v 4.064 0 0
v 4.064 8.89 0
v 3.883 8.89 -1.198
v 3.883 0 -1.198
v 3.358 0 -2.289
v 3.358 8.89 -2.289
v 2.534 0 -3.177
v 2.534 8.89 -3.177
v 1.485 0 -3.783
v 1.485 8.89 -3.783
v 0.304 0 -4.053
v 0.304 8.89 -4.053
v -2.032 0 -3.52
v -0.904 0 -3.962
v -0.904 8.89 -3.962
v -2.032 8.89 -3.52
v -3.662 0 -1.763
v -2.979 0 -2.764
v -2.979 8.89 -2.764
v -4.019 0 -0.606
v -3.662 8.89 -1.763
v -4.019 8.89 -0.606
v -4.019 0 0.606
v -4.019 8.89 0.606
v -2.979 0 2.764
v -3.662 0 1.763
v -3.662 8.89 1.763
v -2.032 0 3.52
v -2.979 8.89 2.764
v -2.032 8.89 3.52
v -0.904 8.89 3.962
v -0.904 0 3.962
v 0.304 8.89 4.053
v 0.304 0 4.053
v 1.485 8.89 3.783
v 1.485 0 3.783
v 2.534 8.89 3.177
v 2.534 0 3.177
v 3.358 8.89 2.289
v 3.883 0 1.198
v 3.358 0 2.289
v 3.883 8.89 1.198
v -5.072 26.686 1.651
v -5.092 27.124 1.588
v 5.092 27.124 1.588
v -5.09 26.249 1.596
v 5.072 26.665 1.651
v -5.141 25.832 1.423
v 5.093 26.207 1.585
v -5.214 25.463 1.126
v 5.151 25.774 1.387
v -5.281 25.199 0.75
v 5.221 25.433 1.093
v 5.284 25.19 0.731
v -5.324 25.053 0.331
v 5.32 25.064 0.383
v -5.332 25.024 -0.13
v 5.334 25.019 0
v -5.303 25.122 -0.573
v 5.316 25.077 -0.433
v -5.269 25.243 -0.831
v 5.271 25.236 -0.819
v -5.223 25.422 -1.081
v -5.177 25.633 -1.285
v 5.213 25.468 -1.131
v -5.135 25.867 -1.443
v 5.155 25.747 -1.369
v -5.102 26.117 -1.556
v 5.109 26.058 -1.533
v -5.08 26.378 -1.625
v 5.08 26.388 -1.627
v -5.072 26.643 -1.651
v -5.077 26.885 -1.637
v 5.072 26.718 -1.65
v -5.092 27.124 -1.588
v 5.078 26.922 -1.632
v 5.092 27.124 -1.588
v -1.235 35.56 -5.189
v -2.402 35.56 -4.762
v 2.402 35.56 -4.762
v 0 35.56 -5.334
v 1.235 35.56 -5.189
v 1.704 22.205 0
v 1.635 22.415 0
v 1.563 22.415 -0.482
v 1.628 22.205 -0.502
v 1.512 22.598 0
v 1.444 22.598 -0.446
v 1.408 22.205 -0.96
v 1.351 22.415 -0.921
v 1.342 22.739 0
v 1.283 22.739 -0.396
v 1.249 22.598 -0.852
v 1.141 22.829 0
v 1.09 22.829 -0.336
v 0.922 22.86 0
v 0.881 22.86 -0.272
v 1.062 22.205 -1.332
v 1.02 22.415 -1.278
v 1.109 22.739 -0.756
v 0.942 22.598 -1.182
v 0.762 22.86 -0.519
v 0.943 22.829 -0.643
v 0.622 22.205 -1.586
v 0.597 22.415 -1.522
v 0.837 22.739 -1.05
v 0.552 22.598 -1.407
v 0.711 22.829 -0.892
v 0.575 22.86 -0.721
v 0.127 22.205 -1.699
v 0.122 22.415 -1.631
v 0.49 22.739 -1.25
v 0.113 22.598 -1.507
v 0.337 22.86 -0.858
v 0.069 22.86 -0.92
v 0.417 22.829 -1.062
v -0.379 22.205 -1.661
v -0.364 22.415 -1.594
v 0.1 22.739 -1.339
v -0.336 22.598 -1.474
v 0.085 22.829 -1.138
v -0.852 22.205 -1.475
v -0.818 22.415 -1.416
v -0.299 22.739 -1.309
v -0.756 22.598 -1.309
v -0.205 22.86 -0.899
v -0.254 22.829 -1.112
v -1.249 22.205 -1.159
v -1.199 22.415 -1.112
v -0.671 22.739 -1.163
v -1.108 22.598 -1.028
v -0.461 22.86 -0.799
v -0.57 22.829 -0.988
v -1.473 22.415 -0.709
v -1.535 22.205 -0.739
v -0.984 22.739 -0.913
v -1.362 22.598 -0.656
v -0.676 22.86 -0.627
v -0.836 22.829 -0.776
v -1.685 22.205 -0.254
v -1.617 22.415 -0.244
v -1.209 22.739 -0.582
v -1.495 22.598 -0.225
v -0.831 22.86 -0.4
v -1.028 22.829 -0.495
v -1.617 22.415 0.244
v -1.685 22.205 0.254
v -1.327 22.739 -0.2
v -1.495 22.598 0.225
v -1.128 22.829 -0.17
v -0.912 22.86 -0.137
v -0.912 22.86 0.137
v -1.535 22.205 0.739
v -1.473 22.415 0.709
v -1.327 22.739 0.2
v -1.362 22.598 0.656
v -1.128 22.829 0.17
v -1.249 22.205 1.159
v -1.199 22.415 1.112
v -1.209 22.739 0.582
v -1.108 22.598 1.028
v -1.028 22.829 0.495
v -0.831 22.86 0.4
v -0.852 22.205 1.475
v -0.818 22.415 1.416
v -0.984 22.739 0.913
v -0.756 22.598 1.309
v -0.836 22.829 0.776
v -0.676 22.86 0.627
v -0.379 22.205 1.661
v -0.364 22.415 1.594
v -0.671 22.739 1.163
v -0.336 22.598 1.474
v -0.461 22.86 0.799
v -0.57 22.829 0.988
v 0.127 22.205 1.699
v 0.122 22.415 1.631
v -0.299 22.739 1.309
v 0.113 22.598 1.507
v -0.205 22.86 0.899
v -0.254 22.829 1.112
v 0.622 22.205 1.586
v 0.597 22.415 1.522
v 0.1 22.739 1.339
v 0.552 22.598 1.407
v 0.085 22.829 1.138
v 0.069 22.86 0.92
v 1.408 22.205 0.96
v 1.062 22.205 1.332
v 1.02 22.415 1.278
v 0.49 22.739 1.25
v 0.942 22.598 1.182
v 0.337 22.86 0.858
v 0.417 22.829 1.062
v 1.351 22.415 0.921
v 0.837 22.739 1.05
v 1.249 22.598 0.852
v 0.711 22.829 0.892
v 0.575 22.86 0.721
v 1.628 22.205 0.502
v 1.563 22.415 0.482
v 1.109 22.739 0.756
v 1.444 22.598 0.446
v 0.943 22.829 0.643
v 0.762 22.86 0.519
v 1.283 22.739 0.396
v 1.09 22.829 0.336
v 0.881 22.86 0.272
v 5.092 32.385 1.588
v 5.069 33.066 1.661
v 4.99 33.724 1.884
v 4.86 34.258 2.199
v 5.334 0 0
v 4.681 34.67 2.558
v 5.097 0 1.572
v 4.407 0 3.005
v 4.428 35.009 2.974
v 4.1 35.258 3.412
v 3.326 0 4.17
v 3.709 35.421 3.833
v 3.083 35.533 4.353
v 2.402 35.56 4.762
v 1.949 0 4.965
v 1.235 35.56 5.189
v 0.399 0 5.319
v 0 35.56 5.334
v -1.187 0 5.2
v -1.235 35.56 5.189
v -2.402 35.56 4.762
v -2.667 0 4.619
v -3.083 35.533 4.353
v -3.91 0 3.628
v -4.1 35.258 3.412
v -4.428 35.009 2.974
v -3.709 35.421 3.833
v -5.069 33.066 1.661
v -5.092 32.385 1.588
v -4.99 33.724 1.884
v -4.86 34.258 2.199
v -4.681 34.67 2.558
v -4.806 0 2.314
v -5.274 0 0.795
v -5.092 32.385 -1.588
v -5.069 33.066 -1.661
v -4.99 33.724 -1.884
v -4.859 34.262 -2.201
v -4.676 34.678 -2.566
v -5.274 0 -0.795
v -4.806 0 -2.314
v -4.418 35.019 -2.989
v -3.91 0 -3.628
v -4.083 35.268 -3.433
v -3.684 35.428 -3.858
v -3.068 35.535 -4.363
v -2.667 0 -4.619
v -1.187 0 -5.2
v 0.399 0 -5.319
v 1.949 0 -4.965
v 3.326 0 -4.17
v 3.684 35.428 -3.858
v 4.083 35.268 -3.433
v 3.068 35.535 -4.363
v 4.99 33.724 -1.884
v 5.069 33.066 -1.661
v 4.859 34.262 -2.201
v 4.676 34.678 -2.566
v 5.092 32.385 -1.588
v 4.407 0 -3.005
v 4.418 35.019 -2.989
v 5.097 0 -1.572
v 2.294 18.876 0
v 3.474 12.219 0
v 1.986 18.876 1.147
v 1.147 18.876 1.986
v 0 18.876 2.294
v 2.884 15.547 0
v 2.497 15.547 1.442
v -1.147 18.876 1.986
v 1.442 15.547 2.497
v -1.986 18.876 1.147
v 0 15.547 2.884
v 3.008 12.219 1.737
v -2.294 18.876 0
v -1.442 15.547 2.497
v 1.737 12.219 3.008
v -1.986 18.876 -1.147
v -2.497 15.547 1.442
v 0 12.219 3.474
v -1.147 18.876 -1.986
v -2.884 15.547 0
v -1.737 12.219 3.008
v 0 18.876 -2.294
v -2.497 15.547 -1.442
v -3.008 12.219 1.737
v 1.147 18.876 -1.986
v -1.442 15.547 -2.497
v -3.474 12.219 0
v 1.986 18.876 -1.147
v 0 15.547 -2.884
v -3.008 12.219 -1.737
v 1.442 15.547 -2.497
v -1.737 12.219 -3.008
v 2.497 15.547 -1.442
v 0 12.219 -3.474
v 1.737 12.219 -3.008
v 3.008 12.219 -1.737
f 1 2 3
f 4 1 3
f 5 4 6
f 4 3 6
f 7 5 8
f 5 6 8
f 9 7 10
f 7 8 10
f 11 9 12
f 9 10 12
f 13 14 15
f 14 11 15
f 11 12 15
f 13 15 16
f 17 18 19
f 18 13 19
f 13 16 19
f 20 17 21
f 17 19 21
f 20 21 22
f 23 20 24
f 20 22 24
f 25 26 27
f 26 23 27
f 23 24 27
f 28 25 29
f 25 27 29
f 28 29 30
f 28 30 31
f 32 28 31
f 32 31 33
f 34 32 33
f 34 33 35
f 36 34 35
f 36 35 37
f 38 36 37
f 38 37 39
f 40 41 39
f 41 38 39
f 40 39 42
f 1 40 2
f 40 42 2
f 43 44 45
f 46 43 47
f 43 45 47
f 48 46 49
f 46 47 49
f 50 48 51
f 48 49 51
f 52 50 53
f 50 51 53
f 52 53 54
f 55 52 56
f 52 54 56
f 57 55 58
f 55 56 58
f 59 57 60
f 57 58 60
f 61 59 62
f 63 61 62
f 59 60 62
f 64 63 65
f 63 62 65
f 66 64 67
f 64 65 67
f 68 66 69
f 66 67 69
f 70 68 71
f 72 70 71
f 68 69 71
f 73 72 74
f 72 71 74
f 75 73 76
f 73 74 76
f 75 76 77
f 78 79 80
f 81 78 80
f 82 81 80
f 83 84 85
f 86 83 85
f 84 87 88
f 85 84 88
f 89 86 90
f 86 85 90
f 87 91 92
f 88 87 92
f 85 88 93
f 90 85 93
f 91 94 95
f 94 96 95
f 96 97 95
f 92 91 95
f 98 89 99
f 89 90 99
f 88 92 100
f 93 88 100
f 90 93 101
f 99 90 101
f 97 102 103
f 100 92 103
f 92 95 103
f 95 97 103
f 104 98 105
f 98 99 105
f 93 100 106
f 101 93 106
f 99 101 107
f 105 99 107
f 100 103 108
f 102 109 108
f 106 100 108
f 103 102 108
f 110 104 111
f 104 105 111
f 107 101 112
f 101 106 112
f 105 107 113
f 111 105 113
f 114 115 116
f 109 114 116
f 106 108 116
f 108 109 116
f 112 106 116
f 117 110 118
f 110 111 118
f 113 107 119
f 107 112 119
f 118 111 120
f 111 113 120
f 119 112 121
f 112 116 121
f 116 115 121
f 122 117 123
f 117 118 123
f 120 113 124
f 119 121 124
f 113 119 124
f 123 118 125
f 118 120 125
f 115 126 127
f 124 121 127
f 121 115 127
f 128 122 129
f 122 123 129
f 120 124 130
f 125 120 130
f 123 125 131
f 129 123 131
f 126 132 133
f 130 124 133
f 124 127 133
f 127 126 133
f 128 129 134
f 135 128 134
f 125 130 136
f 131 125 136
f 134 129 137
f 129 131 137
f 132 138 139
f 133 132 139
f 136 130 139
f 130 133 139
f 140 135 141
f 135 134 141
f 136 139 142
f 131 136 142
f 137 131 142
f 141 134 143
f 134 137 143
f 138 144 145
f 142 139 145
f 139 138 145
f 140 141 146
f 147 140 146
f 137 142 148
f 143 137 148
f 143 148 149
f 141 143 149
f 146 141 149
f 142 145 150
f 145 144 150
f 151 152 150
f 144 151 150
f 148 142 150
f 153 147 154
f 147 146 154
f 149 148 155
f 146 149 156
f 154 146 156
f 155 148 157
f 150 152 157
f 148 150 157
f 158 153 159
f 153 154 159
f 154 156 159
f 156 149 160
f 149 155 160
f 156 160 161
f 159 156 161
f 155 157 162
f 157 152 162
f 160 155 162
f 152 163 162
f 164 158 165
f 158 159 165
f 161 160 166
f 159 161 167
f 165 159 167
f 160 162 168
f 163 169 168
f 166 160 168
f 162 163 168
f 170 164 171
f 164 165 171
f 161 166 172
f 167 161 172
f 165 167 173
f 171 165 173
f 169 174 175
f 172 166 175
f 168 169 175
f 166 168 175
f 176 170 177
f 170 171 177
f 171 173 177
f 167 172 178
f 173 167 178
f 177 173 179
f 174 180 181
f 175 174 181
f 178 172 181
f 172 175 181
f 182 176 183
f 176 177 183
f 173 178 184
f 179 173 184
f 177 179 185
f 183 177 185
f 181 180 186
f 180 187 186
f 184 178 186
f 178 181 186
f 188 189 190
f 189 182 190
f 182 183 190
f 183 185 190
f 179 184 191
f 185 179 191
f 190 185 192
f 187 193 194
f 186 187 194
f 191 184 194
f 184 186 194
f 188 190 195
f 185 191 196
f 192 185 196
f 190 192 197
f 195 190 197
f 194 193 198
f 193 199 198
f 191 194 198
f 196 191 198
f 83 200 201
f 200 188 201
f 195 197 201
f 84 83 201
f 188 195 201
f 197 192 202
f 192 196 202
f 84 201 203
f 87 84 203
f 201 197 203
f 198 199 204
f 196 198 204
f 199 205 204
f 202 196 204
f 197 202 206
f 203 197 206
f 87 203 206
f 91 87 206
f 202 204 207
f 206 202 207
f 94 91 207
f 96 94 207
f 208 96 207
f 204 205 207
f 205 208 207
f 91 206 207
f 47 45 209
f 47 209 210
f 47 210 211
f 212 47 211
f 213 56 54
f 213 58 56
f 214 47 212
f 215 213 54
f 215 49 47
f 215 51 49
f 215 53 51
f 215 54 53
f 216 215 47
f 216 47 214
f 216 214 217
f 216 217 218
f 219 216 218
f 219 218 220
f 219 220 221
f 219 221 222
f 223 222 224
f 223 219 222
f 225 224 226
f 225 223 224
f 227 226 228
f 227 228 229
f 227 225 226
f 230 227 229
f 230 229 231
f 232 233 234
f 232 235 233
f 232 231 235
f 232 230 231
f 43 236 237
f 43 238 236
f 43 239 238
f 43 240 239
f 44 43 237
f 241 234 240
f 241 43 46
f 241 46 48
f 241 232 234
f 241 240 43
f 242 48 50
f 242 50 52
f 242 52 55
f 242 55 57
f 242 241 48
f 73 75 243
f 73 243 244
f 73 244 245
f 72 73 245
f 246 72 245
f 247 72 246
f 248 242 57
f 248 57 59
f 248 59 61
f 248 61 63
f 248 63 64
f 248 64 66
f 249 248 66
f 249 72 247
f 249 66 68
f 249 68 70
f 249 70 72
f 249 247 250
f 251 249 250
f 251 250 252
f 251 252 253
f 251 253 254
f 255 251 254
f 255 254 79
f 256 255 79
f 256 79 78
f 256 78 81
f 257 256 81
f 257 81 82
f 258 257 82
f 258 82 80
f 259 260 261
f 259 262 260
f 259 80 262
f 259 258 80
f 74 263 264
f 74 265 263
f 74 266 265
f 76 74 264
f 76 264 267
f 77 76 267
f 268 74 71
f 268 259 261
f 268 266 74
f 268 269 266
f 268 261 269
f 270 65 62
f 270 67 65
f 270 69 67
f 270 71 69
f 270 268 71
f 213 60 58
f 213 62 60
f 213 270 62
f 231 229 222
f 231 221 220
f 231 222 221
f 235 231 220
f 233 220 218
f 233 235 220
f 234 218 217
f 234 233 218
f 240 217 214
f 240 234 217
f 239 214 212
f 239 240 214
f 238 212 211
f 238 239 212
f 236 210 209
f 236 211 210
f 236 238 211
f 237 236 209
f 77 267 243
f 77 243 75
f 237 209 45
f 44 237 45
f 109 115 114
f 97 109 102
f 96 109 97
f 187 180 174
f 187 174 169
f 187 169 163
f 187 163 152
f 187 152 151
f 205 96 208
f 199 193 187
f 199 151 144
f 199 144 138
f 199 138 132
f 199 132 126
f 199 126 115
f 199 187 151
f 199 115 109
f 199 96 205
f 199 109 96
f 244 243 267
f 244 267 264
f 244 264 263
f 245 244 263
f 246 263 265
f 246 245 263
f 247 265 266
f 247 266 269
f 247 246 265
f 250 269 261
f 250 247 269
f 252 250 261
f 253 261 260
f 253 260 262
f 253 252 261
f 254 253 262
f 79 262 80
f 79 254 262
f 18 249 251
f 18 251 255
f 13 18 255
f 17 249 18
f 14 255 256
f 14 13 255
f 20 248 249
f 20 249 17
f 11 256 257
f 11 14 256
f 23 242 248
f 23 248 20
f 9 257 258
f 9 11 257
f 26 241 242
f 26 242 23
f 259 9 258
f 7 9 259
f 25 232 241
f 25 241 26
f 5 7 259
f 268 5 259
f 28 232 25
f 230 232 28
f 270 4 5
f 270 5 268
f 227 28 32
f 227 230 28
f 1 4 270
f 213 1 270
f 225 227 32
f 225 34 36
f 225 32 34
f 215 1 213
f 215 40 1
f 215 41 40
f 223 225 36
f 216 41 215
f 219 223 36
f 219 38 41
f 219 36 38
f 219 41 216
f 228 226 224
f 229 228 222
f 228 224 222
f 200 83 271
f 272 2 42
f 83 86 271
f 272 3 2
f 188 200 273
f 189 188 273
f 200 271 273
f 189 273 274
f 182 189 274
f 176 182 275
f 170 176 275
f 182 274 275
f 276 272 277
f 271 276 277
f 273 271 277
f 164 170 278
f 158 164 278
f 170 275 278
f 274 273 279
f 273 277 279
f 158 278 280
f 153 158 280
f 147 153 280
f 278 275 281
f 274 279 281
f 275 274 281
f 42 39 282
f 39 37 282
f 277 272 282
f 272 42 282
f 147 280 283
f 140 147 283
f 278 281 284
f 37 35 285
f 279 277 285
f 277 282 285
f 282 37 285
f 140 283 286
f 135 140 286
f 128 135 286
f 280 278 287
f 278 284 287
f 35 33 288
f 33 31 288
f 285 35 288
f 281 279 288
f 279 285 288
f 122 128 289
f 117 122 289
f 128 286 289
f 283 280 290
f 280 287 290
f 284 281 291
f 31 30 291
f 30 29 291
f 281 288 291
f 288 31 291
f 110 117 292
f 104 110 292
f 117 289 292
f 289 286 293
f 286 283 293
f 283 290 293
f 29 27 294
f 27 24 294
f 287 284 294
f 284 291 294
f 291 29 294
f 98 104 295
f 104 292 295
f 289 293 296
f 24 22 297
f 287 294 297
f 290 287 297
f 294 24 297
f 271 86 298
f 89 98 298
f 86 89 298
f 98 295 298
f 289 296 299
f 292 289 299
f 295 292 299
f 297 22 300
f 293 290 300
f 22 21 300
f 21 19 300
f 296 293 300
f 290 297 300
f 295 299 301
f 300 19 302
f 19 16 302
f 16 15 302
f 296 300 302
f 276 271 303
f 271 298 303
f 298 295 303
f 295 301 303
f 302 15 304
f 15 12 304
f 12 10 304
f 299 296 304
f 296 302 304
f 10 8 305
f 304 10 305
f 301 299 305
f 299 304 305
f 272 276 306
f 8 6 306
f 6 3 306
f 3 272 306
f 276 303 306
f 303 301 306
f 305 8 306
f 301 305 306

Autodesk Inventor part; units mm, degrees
ref_plane "XZ Plane" through (0, 0, 0) normal (0, 1, 0) x (-1, 0, 0)
ref_plane "XY Plane" through (0, 0, 0) normal (0, 0, 1) x (1, 0, 0)
sketch "Sketch2" plane through (0, 0, 0) normal (0, 0, 1) x (1, 0, 0)
  line L0 (0, 0) -> (5.334, 0) construction
  line L1 (5.334, 0) -> (5.334, 35.56) construction
  line L2 (5.334, 35.56) -> (0, 35.56) construction
  line L3 (0, 35.56) -> (0, 0) construction
  line L4 (4.064, 0) -> (4.064, 8.89)
  line L5 (4.064, 8.89) -> (1.7036, 22.2048)
  line L6 (0, 22.86) -> (0.9221, 22.86) construction
  line L7 (0, 8.89) -> (4.064, 8.89) construction
  line L8 (0, 22.86) -> (1.5875, 22.86)
  line L9 (4.064, 0) -> (5.334, 0)
  line L10 (0, 35.56) -> (0, 22.86)
  arc A0 (1.7036, 22.2048) -> (0.9221, 22.86) centre (0.9221, 22.0662) ccw
  line L11 (0, 35.56) -> (5.334, 35.56)
  line L12 (5.334, 35.56) -> (5.334, 0)
  dimension "d6" = 5.334
  dimension "d7" = 4.064
  dimension "d8" = 13.97
  dimension "d9" = 1.5875
  dimension "d10" = 8.89
  dimension "d14" = 0.7937
  dimension "d16" = 12.7
revolve "Revolution2" add sketch "Sketch2" angle 360 about axis through (0, 35.56, 0) along (0, -1, 0)
ref_plane "Work Plane1" through (5.334, 17.78, 0) normal (1, 0, 0) x (0, 1, 0)
sketch "Sketch3" plane through (5.334, 17.78, 0) normal (1, 0, 0) x (0, 1, 0)
  arc A0 (9.3435, 1.5875) -> (9.3435, -1.5875) centre (8.89, 0) ccw
  line L0 (17.78, 5.334) -> (17.78, -5.334) construction
  line L1 (17.78, 0) -> (8.89, 0) construction
  line L2 (17.78, -1.5875) -> (9.3435, -1.5875)
  line L3 (17.78, 1.5875) -> (9.3435, 1.5875)
  line L4 (17.78, 1.5875) -> (17.78, -1.5875)
  point P0 (-17.78, 0)
  dimension "d18" = 3.302
  dimension "d19" = 8.89
  dimension "d21" = 1.5875
extrude "Extrusion1" cut sketch "Sketch3" against normal through all
fillet "Fillet1" radius 3.175 2 edges at (0, 35.56, 1.5875) (0, 35.56, -1.5875)
equation "\"d6\" = shaftRadius + nockWallThickness"
equation "\"d7\" = shaftRadius"
equation "\"d8\" = shaftAngledLength"
equation "\"d9\" = shaftTipRadius"
equation "\"d16\" = knockTotalLength"
equation "\"d18\" = nockStringDiameter"
equation "\"d19\" = nockDepthLengh"
equation "\"d21\" = 0.5 * nockEndWidth"
equation "\"shaftTipDiameter\" = 3.175"
equation "\"shaftDiameter\" = 8.128"
equation "\"shaftAngledLength\" = 13.97"
equation "\"nockTotalLength\" = 31.75"
equation "\"shaftTipRadius\" = 0.5 * shaftTipDiameter"
equation "\"shaftRadius\" = 0.5 * shaftDiameter"
equation "\"nockWallThickness\" = 1.27"
equation "\"knockTotalLength\" = 12.7"
equation "\"nockDepthLengh\" = 8.89"
equation "\"nockStringDiameter\" = 3.302"
equation "\"nockEndWidth\" = 3.175"
properties part number "nockForCalli"
